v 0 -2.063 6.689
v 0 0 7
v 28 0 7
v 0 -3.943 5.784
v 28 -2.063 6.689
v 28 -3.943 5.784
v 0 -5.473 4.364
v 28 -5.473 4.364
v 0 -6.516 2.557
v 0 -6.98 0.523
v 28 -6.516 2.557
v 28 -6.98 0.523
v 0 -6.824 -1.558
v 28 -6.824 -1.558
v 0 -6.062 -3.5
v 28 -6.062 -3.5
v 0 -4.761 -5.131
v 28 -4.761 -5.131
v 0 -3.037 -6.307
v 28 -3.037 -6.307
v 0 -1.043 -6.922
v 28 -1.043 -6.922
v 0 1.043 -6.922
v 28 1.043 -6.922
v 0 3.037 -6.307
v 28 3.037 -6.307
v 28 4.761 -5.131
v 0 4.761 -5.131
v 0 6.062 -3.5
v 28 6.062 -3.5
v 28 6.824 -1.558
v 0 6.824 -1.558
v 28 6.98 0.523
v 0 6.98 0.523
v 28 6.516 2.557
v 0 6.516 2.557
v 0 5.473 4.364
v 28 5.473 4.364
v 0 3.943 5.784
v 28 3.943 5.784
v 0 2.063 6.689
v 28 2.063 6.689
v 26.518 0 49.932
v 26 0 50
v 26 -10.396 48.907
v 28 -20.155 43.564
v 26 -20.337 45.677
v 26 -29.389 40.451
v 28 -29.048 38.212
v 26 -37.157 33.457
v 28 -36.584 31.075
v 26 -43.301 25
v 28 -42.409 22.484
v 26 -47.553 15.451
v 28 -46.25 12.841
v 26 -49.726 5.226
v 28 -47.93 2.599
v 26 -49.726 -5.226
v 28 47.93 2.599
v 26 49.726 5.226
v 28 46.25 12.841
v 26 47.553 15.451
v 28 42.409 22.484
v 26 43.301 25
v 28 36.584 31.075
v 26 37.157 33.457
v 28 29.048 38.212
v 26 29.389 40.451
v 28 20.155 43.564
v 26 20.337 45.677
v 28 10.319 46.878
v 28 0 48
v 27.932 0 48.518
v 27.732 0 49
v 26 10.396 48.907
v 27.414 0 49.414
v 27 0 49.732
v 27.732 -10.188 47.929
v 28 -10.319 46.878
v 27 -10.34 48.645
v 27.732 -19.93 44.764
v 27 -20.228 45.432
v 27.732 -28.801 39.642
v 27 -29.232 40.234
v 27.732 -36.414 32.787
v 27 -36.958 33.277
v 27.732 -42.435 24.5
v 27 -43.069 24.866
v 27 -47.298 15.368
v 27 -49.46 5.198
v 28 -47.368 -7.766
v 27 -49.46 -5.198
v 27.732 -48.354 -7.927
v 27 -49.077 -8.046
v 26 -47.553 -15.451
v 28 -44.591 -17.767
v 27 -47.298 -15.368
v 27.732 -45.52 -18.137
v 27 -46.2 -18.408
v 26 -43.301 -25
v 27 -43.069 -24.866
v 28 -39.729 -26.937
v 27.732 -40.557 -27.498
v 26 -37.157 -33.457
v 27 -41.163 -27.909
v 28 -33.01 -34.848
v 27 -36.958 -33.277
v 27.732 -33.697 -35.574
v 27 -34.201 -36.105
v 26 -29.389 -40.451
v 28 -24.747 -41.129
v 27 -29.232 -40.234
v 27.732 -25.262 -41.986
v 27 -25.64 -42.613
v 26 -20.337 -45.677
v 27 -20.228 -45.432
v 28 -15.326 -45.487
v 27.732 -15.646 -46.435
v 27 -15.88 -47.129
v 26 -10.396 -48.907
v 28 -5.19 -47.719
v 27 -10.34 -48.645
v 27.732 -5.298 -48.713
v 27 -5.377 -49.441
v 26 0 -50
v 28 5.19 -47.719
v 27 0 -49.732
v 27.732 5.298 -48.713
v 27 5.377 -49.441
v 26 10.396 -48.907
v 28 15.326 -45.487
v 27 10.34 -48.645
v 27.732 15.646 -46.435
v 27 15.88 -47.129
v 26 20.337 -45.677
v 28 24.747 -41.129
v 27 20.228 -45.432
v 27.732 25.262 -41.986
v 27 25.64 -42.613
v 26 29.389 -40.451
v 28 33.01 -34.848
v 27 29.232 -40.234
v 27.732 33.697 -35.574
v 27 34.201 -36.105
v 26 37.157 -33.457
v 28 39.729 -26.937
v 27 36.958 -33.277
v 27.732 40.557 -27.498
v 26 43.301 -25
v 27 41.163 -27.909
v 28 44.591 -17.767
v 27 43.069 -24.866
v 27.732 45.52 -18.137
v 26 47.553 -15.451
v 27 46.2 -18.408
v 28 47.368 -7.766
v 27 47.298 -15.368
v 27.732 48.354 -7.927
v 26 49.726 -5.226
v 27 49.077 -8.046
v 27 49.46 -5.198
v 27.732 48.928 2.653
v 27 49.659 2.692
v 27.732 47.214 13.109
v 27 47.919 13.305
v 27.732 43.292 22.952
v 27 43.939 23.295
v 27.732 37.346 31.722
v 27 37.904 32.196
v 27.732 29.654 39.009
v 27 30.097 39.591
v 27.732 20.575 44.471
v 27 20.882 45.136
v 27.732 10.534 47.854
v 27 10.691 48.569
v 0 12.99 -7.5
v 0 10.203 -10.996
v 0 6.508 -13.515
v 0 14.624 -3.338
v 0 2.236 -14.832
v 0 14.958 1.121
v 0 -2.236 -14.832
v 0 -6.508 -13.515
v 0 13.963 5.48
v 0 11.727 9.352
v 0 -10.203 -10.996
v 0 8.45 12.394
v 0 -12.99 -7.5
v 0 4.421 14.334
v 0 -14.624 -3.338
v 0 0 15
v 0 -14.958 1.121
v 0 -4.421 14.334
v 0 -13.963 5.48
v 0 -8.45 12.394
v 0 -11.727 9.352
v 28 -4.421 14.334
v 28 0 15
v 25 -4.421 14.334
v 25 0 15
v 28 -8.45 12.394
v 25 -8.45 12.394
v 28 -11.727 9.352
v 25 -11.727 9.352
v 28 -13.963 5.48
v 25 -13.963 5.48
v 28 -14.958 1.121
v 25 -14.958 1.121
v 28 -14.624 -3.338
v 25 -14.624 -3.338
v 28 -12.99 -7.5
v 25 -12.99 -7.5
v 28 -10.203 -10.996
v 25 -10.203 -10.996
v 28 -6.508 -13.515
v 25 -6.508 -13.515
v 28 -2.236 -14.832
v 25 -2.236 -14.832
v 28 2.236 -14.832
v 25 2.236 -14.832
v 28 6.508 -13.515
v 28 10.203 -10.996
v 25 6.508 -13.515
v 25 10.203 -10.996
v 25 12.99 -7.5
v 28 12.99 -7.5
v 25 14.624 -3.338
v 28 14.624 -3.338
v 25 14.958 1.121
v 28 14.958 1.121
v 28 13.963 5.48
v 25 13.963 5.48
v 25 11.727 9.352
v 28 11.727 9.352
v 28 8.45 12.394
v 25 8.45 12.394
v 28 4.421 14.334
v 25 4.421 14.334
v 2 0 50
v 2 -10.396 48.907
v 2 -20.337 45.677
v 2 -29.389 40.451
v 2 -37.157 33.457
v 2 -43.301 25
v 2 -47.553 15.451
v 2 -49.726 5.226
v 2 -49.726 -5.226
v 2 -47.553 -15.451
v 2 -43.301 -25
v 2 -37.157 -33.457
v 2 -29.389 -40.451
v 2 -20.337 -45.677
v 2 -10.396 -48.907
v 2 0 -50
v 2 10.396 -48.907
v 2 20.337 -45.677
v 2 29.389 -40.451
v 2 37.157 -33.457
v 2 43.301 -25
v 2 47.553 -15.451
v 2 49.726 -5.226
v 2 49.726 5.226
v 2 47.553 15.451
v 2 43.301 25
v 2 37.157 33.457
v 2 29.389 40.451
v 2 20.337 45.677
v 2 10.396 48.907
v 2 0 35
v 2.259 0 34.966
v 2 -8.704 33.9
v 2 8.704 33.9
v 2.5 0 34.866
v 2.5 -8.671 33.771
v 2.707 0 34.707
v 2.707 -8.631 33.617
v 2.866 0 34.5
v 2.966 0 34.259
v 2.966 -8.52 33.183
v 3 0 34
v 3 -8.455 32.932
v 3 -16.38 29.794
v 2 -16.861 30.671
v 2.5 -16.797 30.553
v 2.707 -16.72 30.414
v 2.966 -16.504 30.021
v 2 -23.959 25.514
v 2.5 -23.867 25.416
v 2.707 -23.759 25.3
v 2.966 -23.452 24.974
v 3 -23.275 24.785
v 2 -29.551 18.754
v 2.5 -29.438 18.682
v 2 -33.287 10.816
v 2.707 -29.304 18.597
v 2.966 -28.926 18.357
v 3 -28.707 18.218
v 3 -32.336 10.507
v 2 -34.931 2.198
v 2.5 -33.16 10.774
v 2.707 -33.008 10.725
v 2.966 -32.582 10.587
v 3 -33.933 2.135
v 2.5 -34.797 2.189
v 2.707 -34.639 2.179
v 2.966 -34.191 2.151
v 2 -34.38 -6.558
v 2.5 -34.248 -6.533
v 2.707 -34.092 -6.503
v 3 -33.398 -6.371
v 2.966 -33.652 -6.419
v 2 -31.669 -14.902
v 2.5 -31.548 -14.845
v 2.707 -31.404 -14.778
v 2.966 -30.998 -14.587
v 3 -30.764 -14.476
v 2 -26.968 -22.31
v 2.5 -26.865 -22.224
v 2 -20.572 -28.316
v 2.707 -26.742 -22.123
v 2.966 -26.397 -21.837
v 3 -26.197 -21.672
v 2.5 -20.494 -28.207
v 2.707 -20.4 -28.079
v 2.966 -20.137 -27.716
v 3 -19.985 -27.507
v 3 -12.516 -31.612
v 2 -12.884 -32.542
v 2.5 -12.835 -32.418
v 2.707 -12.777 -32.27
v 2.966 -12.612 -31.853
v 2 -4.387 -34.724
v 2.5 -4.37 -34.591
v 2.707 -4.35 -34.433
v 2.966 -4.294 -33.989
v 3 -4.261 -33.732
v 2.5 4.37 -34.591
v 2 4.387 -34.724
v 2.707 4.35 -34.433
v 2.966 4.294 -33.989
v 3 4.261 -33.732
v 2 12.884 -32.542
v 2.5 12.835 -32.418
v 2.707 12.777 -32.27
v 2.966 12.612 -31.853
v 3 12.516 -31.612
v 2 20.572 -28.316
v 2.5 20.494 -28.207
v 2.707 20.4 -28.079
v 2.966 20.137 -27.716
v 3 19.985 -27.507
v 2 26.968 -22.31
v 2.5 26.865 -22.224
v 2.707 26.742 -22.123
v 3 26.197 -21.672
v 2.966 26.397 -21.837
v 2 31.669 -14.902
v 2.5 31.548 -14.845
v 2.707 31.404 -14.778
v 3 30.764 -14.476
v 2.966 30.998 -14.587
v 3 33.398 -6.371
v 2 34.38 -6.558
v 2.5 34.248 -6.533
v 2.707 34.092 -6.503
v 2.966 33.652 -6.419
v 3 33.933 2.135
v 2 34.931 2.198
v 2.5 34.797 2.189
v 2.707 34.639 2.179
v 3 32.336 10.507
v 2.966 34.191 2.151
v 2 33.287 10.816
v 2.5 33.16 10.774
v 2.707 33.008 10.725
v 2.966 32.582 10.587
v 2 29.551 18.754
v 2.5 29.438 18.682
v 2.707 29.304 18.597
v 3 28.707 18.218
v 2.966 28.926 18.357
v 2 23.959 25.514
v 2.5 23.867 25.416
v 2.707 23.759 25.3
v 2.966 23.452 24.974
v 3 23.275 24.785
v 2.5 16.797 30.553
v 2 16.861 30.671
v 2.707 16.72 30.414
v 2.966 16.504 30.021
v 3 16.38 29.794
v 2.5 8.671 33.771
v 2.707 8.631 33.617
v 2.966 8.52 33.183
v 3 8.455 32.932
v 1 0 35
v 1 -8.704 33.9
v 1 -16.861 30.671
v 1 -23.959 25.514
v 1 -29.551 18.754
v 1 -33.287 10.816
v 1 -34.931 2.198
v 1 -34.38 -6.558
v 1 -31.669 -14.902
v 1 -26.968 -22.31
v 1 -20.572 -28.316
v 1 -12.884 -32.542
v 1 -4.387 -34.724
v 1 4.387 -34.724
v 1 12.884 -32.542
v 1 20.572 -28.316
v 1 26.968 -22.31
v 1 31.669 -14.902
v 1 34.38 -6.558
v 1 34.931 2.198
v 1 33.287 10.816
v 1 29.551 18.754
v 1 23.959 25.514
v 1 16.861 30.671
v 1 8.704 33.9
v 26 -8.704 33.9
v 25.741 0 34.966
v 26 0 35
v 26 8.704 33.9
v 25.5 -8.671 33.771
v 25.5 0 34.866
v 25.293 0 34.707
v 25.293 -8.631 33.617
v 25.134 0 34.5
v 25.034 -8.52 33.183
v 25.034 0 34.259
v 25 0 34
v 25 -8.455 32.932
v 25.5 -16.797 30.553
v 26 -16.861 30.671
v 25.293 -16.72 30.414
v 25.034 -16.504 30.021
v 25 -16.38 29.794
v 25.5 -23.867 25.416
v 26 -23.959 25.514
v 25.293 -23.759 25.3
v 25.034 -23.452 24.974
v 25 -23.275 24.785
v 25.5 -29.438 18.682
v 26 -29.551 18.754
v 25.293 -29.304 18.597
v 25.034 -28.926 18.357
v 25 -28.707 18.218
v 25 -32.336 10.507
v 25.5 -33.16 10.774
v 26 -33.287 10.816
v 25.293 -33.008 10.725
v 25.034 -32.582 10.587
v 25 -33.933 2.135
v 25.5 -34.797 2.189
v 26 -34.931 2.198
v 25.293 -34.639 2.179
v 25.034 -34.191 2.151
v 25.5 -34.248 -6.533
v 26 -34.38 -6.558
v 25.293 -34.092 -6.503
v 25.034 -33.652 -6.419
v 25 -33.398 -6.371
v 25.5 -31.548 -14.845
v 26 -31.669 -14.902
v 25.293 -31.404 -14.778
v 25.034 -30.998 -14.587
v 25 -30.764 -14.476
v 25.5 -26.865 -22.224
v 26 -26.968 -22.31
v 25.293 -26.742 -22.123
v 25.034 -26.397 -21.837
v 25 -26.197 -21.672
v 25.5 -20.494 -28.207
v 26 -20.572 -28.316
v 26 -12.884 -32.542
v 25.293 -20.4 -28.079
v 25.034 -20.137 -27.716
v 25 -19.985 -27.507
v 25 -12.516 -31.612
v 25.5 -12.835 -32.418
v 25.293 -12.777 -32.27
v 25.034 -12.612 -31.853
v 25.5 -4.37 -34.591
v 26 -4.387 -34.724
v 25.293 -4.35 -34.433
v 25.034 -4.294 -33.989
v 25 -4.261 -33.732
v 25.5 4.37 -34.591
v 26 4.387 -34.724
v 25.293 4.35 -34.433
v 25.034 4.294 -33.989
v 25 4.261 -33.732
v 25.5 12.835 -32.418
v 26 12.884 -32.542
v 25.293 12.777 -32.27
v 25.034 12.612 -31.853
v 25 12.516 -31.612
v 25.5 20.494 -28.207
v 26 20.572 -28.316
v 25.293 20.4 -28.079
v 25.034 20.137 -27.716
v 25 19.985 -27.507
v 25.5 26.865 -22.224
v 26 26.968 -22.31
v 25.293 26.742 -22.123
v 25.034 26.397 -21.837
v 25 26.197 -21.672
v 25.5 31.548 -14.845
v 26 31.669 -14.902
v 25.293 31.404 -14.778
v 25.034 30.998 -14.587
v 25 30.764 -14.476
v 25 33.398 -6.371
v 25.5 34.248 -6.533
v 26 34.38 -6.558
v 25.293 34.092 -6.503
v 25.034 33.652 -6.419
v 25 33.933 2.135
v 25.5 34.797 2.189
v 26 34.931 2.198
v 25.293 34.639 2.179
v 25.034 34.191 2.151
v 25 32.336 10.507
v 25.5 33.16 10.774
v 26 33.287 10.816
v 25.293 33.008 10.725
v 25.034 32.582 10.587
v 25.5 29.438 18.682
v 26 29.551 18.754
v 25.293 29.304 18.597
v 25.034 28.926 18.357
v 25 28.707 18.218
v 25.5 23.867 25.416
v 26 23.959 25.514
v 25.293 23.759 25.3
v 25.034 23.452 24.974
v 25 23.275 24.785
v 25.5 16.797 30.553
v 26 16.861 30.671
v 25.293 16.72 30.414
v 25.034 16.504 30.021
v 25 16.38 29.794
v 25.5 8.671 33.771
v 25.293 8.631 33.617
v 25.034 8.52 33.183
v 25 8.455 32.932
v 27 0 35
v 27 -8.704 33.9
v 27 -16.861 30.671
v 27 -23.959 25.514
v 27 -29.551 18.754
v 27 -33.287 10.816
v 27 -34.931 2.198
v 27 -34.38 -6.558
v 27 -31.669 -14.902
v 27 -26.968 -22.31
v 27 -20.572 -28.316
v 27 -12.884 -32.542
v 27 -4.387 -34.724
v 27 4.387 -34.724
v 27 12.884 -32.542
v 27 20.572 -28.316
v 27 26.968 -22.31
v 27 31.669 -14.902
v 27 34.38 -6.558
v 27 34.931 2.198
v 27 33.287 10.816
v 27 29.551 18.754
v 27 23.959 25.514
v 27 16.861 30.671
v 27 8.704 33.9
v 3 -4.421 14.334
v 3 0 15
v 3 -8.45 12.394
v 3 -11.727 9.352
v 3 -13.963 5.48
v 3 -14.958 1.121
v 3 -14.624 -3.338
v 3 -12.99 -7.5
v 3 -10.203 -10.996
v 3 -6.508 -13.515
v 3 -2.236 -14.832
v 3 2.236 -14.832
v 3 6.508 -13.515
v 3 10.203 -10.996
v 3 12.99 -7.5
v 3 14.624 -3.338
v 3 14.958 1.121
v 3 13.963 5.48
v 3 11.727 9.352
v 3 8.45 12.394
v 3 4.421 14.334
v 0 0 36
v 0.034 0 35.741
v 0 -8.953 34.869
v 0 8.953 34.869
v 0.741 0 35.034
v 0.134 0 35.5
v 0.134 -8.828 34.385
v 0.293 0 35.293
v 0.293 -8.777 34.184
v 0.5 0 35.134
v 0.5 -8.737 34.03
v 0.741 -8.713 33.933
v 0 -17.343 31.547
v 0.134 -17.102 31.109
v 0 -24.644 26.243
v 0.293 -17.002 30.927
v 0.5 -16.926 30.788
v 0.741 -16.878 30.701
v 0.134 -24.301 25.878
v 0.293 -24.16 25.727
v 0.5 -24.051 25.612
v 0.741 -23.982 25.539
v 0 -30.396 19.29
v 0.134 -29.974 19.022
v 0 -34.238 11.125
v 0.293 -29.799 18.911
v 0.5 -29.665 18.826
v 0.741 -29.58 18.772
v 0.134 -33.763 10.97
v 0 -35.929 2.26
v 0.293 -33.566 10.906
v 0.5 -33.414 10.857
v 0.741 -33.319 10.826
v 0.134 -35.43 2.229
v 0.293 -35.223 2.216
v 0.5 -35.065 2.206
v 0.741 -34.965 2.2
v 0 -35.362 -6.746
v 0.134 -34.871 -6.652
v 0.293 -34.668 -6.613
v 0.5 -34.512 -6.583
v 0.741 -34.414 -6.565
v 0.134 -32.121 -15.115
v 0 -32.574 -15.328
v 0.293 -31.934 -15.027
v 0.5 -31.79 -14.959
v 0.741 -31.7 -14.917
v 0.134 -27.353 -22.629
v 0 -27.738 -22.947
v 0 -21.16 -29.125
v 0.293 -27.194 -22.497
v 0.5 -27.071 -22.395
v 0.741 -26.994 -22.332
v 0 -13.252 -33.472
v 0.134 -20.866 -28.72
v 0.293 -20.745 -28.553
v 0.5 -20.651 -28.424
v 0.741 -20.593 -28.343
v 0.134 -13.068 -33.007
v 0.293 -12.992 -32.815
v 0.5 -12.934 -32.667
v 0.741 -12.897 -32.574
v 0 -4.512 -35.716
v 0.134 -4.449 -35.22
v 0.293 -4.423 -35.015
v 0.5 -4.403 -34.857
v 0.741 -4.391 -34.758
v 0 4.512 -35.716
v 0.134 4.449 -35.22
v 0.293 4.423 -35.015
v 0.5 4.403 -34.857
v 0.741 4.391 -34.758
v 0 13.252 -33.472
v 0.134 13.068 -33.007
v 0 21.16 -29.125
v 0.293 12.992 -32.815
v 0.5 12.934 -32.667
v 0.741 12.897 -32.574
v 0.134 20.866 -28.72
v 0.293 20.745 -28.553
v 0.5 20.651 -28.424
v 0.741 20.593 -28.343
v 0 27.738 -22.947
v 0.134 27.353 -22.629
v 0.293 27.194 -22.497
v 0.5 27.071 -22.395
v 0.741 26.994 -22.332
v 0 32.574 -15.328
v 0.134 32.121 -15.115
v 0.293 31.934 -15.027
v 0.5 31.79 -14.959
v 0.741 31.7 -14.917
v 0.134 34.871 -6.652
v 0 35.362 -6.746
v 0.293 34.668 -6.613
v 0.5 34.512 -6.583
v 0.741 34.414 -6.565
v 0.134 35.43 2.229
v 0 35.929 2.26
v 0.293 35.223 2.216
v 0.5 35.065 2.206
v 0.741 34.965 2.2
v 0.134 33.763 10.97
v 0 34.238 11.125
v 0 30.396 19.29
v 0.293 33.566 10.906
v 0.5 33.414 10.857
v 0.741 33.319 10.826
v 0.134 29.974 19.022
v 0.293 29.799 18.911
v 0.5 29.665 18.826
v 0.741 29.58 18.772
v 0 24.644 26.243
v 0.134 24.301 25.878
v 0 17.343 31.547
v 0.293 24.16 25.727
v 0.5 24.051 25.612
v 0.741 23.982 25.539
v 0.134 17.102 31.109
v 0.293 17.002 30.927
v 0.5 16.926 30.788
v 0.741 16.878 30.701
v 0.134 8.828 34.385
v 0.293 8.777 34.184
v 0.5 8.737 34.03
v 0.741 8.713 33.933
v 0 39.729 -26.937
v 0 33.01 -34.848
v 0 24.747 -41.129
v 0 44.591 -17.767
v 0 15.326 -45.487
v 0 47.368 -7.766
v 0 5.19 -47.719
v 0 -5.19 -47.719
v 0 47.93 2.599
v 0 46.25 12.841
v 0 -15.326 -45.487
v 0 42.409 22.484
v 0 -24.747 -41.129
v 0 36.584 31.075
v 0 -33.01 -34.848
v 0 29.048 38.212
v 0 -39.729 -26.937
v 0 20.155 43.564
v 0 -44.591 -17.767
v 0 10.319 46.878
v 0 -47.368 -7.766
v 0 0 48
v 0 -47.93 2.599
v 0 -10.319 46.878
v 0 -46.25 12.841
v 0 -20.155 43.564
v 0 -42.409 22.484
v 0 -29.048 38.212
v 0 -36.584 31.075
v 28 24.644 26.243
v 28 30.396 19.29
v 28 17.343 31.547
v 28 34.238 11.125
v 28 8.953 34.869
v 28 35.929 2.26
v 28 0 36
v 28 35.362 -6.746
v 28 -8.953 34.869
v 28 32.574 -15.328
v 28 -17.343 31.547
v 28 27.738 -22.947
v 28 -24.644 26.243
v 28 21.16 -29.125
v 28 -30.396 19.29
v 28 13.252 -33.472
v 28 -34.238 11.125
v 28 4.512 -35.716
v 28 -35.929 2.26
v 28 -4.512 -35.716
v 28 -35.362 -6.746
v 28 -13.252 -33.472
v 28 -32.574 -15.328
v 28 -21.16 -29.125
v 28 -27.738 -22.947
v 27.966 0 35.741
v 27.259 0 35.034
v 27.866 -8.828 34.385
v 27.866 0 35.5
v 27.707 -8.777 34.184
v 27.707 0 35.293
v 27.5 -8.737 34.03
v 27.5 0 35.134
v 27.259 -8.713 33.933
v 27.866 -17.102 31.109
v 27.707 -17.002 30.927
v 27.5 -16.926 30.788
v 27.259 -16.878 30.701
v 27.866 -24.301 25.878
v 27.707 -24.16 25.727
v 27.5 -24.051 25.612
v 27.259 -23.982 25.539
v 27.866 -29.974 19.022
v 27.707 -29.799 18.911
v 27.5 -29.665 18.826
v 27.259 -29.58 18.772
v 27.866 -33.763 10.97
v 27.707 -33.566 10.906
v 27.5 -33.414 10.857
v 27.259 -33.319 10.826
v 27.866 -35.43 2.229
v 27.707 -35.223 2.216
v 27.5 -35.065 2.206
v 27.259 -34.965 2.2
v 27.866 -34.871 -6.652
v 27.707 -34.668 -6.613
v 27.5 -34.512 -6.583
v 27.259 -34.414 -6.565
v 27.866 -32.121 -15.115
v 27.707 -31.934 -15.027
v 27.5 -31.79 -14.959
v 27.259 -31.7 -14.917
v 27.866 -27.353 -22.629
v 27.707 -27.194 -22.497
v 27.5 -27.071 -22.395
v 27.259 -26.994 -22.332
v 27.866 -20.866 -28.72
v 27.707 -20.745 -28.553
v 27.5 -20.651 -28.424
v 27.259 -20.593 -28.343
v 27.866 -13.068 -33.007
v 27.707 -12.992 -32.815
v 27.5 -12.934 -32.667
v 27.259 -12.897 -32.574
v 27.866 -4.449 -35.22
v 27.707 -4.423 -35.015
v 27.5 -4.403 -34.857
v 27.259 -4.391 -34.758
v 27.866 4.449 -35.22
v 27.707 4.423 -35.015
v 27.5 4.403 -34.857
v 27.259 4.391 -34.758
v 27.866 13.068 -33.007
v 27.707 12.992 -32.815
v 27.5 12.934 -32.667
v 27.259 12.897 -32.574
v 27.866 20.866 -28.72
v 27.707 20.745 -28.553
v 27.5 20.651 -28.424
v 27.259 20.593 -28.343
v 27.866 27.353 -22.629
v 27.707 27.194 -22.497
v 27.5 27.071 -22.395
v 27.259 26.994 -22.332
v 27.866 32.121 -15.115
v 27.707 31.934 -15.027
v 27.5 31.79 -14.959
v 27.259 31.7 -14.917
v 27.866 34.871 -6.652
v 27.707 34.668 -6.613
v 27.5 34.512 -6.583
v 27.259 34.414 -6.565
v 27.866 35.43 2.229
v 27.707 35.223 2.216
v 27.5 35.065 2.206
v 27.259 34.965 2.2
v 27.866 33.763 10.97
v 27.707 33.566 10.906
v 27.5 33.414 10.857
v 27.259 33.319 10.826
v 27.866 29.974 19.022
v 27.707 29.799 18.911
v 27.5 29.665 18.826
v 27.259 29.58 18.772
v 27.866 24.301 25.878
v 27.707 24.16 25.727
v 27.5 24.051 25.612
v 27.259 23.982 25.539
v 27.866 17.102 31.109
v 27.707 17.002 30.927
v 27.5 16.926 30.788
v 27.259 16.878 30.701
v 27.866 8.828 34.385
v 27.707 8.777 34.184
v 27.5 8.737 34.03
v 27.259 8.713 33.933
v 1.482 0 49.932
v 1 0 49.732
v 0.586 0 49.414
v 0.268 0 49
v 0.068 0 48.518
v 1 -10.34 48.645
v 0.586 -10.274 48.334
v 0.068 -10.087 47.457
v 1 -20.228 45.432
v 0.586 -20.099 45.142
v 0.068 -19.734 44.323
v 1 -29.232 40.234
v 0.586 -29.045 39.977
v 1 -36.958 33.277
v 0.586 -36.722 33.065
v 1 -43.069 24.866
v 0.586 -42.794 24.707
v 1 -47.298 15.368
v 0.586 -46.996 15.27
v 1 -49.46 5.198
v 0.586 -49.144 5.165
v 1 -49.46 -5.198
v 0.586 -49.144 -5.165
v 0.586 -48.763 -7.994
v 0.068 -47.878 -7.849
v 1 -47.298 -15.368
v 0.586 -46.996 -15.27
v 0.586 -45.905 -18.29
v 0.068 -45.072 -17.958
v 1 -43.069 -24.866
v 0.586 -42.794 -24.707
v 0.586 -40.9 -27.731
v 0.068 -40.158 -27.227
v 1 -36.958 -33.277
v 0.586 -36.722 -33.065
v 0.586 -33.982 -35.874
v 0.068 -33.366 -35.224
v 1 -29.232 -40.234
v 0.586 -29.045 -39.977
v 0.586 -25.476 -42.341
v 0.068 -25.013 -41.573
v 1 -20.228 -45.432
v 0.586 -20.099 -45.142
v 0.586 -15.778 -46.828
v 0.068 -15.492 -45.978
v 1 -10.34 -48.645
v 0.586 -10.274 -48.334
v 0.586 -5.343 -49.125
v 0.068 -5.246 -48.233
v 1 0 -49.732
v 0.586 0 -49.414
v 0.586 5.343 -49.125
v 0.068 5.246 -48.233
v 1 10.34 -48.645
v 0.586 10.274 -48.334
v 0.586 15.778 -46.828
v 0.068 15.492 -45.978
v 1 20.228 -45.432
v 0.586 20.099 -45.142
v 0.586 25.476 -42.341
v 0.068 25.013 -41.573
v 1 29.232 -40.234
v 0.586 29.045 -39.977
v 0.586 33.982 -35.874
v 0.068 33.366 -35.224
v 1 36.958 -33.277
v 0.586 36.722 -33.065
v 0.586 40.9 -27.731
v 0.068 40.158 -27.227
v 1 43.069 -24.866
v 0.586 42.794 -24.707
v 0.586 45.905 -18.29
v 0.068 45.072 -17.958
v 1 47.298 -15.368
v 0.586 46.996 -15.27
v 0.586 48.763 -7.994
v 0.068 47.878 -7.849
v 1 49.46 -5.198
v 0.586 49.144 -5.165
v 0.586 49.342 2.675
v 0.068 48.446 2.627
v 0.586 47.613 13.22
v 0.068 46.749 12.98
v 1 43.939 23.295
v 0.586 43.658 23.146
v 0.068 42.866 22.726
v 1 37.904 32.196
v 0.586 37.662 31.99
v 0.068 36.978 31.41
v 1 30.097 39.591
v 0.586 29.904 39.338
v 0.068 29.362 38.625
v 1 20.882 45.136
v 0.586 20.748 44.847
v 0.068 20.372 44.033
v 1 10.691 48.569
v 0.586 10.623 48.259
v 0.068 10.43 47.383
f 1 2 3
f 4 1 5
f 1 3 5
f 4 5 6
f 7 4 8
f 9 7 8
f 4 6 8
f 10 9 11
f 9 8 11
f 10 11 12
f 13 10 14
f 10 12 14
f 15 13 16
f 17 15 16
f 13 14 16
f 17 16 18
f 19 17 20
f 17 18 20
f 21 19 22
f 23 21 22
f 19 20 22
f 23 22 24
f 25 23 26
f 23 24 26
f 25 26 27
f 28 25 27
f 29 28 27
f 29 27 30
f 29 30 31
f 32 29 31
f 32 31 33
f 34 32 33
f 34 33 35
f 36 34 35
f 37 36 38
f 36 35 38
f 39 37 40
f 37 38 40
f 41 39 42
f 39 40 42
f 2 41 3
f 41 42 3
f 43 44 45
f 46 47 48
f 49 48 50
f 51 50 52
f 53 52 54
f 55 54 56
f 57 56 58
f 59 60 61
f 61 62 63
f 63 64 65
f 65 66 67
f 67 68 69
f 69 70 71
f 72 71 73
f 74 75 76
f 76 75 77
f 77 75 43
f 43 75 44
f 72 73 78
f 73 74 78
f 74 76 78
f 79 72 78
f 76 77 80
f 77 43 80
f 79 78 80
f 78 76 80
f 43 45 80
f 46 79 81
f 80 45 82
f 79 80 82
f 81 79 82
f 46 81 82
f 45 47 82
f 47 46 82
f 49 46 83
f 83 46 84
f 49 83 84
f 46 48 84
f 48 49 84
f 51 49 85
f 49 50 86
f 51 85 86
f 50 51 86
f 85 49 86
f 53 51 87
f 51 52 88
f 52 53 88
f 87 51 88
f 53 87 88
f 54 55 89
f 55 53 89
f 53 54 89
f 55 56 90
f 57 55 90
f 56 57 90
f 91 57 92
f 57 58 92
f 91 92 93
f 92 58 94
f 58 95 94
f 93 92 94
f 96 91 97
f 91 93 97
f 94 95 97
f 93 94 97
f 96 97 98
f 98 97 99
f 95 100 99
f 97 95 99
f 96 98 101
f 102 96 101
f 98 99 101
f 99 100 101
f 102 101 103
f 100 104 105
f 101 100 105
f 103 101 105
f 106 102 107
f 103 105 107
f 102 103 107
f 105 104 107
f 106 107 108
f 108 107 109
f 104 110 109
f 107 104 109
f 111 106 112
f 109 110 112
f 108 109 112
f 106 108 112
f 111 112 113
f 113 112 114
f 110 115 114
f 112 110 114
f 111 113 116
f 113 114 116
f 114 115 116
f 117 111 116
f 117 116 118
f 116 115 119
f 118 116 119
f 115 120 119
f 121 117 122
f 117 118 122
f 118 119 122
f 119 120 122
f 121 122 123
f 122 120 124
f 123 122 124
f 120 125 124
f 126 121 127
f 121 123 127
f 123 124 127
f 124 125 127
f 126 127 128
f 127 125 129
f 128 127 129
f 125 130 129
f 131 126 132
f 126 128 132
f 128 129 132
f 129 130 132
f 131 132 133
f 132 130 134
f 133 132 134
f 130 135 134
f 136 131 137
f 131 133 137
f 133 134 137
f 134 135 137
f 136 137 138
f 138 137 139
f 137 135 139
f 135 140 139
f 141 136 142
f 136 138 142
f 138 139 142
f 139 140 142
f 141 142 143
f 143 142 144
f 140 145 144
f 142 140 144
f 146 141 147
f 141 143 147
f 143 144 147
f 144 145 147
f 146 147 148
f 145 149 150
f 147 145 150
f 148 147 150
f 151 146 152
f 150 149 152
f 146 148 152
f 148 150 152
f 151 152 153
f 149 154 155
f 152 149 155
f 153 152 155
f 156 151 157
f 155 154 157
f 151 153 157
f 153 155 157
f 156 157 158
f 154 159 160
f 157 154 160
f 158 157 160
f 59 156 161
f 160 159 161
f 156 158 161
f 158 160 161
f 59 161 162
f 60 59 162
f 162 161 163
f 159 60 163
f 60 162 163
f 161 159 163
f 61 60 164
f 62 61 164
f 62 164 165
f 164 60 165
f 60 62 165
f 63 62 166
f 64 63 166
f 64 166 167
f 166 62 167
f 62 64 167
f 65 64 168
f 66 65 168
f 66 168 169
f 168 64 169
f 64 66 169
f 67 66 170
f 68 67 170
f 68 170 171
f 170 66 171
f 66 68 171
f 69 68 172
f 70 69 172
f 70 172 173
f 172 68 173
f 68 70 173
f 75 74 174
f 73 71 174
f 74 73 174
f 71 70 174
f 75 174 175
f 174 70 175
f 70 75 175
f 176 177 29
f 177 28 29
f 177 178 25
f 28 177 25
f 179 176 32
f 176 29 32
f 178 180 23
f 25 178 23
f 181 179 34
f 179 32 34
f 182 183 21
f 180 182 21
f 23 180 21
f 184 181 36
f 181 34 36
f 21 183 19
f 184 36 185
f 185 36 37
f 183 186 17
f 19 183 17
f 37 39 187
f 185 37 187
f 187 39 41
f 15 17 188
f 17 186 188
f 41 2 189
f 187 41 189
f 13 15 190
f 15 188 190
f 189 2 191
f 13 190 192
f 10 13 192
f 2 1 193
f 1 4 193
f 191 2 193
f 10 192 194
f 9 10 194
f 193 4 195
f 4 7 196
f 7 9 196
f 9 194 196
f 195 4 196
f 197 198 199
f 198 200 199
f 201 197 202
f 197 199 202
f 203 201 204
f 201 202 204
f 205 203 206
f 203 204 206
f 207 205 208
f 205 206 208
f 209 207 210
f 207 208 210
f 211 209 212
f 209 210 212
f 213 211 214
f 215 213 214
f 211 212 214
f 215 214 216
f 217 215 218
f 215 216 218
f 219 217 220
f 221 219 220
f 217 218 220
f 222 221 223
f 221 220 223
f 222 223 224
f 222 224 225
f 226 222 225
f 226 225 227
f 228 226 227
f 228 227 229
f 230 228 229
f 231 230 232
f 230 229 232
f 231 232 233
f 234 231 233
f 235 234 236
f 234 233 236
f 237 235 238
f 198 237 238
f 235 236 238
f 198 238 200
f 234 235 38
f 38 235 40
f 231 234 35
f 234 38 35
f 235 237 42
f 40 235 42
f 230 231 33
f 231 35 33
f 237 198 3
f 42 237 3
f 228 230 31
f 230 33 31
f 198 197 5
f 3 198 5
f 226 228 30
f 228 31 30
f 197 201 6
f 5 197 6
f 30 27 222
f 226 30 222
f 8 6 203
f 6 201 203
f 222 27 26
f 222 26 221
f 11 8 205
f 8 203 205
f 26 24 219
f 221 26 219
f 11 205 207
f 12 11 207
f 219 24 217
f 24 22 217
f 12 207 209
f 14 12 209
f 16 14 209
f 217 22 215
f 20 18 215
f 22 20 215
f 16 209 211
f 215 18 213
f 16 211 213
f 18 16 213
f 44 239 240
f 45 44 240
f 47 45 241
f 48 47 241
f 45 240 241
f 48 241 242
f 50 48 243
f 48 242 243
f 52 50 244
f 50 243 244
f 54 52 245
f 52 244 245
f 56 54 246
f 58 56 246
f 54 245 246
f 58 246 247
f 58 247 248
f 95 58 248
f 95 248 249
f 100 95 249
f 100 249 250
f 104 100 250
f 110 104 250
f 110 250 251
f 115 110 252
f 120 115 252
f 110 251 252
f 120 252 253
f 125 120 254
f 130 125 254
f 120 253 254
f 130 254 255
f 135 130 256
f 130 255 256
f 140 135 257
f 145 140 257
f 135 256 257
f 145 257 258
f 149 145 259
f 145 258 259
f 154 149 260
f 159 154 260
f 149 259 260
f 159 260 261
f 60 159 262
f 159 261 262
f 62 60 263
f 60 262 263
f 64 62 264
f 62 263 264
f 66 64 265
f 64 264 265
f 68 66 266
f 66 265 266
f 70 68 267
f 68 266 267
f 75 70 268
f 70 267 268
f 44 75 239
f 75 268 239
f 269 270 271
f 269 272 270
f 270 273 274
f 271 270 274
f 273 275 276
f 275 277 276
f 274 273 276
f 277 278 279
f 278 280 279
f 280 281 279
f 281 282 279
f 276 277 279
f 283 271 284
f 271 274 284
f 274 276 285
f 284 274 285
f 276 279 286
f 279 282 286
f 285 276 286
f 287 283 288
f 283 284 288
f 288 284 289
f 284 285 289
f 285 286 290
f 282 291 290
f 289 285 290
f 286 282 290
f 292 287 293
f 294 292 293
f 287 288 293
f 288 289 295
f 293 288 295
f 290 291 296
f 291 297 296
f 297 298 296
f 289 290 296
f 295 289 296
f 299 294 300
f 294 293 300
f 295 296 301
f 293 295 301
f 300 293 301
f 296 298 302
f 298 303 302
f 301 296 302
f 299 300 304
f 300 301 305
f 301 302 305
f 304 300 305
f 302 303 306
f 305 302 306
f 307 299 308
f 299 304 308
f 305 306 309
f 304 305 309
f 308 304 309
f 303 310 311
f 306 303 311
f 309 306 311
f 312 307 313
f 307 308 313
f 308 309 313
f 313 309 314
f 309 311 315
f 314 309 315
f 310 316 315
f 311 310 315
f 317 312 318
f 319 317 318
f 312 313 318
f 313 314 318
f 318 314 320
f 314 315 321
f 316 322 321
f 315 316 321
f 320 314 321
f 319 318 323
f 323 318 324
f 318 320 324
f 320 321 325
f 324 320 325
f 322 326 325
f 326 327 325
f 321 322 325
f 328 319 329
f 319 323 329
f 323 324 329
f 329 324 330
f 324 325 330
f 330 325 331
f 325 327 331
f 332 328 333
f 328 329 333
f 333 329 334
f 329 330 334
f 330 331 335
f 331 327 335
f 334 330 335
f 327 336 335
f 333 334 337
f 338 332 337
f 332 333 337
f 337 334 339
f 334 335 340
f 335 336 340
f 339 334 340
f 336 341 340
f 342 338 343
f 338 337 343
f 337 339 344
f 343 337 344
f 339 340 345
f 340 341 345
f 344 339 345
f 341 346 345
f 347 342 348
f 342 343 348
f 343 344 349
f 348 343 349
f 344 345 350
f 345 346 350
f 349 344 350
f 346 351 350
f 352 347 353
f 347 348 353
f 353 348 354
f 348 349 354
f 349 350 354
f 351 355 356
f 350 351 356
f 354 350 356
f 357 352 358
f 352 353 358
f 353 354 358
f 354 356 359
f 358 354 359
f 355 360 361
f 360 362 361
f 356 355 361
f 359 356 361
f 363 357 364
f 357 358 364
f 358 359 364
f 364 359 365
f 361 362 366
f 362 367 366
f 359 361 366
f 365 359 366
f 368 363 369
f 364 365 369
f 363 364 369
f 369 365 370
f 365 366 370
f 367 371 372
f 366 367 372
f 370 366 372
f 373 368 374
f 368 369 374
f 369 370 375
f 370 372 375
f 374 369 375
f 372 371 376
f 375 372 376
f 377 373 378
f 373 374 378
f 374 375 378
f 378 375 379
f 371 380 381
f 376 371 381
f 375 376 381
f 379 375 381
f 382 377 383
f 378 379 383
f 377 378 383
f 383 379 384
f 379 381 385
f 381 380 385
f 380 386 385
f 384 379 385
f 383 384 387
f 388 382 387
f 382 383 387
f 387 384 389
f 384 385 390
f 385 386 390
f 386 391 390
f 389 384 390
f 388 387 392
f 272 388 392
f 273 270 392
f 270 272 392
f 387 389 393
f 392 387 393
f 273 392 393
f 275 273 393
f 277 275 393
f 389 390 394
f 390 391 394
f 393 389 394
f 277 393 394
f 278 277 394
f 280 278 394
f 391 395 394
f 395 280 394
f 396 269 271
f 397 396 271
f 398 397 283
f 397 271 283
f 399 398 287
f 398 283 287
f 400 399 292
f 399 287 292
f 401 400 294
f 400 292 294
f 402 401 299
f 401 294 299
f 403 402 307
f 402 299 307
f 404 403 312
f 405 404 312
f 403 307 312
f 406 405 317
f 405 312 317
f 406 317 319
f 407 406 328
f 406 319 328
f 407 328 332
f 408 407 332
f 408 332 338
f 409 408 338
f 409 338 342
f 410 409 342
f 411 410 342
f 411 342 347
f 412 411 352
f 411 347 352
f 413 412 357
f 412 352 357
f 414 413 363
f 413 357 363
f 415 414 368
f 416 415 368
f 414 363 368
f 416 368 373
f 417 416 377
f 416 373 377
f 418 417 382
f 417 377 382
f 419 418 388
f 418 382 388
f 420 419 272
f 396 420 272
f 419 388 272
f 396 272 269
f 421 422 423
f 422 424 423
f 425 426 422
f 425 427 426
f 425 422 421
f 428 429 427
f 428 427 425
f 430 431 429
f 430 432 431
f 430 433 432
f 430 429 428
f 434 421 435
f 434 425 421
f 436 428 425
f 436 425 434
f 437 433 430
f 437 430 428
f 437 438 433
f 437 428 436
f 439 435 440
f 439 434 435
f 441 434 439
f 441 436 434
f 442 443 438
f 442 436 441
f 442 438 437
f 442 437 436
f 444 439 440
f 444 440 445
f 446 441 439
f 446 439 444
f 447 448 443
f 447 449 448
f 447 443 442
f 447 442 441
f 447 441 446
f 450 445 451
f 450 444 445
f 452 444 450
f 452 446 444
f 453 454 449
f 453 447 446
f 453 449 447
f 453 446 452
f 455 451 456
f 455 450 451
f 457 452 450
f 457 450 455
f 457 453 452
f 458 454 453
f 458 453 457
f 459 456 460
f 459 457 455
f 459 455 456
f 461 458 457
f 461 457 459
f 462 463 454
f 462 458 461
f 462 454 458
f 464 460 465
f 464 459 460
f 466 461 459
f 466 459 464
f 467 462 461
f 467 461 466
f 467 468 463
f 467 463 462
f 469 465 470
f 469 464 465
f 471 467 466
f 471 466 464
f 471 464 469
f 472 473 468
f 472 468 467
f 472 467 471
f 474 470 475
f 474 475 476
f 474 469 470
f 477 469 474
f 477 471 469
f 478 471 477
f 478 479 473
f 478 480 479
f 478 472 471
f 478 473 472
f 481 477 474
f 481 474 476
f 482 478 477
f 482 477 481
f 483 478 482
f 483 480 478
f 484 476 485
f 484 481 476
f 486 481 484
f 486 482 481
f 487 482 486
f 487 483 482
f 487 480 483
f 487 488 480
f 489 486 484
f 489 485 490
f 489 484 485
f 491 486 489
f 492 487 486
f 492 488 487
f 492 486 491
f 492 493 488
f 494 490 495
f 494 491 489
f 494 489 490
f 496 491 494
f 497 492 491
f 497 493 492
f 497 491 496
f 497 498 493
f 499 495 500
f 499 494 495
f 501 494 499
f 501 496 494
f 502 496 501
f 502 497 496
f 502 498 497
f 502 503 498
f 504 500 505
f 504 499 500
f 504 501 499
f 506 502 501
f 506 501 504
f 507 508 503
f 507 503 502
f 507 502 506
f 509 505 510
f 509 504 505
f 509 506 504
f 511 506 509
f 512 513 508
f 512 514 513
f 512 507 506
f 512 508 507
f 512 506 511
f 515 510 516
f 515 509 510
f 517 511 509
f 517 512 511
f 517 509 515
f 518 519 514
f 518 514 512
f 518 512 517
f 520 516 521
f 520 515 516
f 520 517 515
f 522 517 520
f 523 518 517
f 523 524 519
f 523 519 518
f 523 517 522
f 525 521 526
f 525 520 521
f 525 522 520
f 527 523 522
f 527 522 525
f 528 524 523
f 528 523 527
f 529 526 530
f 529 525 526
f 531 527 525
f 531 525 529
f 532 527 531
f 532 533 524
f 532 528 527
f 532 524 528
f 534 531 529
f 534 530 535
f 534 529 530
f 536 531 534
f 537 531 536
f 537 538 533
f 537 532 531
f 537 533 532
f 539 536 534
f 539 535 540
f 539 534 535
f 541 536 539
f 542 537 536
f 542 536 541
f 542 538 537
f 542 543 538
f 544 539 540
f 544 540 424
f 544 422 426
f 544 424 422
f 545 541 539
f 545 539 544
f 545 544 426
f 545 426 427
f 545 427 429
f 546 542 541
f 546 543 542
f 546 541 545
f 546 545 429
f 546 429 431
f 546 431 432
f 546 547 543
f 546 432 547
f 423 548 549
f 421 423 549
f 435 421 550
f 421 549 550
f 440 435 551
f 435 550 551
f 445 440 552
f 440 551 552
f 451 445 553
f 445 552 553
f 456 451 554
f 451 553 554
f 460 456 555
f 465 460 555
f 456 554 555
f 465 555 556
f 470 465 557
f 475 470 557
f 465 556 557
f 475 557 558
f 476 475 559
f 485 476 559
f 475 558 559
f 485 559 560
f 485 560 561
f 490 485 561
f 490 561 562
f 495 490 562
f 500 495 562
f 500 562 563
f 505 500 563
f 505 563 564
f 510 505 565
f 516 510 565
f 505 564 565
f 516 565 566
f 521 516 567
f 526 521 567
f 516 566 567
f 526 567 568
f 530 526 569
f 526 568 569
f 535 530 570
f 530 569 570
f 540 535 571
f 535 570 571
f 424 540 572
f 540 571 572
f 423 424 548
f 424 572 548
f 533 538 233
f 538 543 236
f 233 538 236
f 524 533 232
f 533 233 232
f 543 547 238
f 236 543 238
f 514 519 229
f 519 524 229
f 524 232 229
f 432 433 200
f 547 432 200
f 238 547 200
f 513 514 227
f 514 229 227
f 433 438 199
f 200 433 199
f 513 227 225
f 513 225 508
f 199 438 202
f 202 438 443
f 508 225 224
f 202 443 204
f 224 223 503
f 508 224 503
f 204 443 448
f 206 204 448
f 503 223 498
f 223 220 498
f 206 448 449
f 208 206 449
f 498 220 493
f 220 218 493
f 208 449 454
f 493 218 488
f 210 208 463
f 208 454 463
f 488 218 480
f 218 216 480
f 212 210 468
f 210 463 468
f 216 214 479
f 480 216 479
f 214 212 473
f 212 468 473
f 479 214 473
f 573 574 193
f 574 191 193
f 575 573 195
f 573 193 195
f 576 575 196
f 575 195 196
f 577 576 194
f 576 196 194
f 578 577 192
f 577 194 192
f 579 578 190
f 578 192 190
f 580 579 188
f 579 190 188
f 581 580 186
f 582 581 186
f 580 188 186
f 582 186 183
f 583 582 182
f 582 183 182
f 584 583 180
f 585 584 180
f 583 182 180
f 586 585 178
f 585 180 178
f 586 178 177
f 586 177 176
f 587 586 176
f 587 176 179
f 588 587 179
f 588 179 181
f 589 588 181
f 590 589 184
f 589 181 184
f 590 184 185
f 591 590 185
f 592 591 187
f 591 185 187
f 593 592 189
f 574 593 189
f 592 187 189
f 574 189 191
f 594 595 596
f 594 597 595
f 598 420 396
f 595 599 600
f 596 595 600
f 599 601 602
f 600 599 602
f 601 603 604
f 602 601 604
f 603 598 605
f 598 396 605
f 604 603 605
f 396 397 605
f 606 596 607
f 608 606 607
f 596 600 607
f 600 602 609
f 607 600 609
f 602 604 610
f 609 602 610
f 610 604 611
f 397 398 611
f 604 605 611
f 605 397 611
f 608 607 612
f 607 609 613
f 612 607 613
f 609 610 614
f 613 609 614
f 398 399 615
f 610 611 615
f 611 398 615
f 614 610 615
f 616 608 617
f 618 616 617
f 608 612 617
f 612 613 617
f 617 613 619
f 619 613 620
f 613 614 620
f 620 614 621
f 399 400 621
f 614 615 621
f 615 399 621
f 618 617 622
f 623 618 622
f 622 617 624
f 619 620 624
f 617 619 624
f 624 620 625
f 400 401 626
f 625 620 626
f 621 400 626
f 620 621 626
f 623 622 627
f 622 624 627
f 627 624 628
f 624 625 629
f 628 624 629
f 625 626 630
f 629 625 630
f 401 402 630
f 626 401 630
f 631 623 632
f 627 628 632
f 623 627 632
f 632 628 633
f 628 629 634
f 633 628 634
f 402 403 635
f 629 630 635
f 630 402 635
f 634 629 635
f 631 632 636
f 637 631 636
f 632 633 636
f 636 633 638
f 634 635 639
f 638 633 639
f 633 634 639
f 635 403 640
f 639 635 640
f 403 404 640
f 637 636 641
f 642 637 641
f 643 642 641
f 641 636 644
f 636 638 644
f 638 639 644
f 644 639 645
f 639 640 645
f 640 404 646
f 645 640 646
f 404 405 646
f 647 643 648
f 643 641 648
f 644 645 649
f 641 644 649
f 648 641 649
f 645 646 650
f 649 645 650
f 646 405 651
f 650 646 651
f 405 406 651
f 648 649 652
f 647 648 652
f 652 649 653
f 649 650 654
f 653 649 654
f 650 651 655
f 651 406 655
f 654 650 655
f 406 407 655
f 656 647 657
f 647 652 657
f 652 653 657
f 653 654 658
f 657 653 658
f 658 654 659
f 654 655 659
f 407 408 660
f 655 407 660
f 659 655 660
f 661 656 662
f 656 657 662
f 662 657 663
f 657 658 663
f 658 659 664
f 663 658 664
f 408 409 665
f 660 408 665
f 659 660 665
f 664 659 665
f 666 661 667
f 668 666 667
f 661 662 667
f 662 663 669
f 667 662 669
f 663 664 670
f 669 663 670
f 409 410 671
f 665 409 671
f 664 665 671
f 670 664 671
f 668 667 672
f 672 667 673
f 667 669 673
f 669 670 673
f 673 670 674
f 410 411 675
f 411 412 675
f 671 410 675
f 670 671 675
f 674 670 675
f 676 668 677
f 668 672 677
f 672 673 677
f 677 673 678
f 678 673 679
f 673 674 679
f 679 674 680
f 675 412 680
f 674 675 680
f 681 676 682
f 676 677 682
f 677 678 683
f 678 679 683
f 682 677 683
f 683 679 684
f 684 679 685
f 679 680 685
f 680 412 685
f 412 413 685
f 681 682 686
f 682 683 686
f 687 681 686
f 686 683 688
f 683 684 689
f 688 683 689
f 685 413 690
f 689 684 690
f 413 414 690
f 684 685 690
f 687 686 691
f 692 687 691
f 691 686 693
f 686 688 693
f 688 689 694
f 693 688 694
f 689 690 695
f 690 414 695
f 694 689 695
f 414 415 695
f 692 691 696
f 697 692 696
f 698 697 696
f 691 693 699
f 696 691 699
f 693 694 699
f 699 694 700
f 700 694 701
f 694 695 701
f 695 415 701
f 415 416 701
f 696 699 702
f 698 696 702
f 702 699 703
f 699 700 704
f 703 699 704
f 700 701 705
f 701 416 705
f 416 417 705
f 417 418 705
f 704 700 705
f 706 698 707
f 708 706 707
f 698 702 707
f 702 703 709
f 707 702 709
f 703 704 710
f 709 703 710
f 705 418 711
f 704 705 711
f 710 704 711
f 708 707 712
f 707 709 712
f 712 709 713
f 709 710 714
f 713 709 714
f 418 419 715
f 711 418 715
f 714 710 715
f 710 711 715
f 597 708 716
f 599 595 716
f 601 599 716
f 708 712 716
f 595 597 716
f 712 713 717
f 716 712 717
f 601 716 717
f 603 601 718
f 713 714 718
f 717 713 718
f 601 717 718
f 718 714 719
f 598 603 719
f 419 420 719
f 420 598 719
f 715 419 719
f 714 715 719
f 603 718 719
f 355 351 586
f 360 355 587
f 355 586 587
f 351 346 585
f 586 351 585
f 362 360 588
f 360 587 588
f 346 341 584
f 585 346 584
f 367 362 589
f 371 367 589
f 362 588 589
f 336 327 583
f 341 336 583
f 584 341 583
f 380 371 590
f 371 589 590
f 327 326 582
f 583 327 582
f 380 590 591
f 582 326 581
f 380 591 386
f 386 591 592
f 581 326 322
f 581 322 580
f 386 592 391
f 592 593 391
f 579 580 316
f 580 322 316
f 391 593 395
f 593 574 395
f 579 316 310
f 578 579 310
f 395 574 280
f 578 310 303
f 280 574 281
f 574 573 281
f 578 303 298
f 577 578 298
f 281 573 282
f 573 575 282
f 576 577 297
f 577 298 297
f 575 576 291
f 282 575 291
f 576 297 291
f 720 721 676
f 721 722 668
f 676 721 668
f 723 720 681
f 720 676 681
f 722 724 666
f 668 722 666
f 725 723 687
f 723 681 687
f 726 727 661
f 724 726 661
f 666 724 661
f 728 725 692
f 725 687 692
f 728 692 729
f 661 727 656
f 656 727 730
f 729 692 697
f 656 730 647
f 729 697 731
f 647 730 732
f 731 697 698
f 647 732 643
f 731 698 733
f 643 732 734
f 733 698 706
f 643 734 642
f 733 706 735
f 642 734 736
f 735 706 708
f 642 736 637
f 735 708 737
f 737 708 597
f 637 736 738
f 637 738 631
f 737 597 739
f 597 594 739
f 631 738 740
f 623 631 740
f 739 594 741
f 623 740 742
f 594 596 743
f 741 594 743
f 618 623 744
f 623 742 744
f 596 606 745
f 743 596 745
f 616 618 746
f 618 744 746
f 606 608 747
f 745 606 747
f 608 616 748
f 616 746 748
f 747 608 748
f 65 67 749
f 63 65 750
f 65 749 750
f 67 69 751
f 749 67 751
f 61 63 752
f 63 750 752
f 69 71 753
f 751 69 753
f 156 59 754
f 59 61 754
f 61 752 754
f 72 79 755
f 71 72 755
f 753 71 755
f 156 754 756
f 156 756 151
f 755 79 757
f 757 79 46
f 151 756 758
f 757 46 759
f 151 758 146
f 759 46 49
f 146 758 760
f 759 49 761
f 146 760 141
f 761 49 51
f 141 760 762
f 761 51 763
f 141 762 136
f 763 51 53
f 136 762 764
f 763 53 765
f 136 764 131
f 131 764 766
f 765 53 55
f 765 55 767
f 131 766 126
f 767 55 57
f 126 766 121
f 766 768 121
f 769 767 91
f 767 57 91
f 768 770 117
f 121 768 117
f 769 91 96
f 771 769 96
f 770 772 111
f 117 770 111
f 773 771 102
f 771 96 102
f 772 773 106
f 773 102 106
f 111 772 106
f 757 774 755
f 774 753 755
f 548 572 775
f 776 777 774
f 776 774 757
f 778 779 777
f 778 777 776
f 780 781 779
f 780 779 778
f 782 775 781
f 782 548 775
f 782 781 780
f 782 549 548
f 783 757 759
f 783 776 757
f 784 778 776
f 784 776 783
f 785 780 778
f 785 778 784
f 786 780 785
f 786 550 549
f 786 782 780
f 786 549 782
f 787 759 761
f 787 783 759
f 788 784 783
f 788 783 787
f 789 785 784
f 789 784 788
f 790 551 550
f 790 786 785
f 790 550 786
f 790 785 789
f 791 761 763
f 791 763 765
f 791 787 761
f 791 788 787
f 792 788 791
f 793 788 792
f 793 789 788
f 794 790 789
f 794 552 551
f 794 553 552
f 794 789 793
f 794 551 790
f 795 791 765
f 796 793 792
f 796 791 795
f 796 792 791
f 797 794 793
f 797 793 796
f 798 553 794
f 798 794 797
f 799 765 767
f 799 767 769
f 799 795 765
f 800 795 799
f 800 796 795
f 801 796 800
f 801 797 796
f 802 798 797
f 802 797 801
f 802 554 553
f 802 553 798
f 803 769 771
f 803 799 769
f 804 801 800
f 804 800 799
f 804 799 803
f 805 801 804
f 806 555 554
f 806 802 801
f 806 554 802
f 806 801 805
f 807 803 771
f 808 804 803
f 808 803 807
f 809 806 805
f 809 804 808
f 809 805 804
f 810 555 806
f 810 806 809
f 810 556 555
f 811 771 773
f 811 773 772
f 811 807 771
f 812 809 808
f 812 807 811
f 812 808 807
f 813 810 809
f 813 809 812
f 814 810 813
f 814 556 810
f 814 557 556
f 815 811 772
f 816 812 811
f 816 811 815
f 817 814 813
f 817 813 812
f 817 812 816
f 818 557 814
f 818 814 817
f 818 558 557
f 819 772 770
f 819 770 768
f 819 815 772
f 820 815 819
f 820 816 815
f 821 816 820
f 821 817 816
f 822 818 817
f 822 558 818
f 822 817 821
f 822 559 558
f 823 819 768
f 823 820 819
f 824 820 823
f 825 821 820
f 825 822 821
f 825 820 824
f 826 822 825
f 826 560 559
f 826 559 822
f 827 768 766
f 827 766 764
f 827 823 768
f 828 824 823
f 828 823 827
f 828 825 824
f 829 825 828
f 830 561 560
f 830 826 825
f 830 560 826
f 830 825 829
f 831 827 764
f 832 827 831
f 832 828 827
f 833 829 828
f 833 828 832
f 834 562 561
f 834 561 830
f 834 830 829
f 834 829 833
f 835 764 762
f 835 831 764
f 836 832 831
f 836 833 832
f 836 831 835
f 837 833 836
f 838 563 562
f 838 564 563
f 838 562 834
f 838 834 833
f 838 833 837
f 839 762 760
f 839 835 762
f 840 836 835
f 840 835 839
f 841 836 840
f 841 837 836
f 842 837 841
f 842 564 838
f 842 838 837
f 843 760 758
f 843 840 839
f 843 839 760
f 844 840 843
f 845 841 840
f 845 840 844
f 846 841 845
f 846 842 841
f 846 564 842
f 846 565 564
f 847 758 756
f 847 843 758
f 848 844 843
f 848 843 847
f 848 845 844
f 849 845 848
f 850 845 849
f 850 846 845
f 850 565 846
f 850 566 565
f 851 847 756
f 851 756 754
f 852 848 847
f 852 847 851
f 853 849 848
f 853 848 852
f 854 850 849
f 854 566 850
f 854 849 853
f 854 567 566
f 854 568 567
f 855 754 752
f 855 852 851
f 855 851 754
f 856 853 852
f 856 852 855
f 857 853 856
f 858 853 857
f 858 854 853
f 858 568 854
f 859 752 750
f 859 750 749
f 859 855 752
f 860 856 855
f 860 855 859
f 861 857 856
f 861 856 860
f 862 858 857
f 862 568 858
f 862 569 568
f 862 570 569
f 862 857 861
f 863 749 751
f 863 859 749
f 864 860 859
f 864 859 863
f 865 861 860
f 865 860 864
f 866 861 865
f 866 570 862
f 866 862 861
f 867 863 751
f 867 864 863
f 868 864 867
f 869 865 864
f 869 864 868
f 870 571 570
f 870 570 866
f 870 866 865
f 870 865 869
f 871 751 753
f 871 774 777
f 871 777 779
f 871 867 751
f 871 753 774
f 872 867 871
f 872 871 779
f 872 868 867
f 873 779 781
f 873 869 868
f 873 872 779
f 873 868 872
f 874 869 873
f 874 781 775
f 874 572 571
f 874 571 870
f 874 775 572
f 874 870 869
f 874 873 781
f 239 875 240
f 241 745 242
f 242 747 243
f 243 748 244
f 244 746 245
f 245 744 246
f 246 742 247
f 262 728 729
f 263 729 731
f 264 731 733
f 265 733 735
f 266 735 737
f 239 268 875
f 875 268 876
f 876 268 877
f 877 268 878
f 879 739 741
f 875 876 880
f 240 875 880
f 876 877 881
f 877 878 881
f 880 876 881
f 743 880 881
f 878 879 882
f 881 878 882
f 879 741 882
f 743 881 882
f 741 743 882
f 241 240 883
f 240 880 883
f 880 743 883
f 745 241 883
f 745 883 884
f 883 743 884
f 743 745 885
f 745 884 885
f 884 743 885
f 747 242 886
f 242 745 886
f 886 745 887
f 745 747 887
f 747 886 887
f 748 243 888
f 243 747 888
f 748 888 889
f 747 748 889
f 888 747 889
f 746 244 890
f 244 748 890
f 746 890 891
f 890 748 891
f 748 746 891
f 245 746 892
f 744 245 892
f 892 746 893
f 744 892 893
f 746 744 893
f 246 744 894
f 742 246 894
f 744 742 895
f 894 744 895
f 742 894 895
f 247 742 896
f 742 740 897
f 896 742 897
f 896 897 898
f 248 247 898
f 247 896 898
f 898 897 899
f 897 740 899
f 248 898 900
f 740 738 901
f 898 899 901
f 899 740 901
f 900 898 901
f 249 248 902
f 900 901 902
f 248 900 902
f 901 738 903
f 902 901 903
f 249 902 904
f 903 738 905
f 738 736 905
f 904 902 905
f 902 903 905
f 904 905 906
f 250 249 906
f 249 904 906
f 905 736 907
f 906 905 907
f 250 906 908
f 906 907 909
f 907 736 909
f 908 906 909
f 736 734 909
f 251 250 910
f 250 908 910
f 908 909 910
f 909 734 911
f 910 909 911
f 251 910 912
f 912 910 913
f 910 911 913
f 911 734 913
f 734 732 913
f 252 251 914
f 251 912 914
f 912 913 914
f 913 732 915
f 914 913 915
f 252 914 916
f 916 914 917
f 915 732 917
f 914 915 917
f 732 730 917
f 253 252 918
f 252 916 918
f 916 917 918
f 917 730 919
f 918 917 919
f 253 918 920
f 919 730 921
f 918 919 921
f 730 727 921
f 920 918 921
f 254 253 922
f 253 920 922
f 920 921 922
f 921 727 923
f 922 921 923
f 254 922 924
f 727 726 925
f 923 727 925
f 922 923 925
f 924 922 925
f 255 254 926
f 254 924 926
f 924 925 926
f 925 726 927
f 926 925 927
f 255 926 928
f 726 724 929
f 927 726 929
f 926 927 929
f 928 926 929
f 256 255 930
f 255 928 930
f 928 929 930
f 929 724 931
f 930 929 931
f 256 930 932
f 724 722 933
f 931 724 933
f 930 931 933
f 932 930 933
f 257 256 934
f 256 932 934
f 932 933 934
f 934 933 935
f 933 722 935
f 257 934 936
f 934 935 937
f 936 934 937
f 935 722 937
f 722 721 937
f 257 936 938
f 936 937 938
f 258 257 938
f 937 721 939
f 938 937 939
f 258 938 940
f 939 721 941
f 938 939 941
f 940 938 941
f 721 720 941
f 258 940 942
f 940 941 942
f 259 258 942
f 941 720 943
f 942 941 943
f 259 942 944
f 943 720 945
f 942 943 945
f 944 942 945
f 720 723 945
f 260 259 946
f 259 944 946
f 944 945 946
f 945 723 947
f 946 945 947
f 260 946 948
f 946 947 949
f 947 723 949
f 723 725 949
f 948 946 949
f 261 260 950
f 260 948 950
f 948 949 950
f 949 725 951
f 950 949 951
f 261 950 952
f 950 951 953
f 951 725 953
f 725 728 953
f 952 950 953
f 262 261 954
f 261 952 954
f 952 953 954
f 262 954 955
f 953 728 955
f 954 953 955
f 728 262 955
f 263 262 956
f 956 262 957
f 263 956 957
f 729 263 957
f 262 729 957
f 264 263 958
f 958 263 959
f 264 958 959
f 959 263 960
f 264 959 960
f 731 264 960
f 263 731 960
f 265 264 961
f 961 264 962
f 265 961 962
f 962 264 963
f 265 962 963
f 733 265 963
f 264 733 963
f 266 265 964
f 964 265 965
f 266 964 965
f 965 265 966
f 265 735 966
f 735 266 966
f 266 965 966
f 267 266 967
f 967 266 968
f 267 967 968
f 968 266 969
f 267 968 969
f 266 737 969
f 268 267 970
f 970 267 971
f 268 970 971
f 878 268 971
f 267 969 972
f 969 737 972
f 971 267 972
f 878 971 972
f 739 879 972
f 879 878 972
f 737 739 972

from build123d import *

# Parameters (mm, degrees)
REDONDEO1_R = 2
REDONDEO2_R = 1


with BuildPart() as part:
    # Croquis1 → Revolución1 (revolve)
    with BuildSketch(Plane.XY, mode=Mode.PRIVATE) as revoluci_n1_sk:
        Polygon((0, 7), (28, 7), (28, 15), (25, 15), (25, 35), (28, 35), (28, 50), (0, 50), (0, 35), (3, 35), (3, 15), (0, 15), align=None)
    revolve(revoluci_n1_sk.sketch.rotate(Axis((-1.552010625, 0, 0), (1, 0, 0)), 90), axis=Axis((-1.552010625, 0, 0), (1, 0, 0)))

    # Redondeo1
    redondeo1_edges = [part.edges().sort_by_distance(p)[0] for p in [
        (0, 0, -50),
        (28, 0, -50),
    ]]
    fillet(redondeo1_edges, radius=REDONDEO1_R)

    # Redondeo2
    redondeo2_edges = [part.edges().sort_by_distance(p)[0] for p in [
        (28, 0, -35),
        (25, 0, -35),
        (3, 0, -35),
        (0, 0, -35),
    ]]
    fillet(redondeo2_edges, radius=REDONDEO2_R)


solid = part.part
